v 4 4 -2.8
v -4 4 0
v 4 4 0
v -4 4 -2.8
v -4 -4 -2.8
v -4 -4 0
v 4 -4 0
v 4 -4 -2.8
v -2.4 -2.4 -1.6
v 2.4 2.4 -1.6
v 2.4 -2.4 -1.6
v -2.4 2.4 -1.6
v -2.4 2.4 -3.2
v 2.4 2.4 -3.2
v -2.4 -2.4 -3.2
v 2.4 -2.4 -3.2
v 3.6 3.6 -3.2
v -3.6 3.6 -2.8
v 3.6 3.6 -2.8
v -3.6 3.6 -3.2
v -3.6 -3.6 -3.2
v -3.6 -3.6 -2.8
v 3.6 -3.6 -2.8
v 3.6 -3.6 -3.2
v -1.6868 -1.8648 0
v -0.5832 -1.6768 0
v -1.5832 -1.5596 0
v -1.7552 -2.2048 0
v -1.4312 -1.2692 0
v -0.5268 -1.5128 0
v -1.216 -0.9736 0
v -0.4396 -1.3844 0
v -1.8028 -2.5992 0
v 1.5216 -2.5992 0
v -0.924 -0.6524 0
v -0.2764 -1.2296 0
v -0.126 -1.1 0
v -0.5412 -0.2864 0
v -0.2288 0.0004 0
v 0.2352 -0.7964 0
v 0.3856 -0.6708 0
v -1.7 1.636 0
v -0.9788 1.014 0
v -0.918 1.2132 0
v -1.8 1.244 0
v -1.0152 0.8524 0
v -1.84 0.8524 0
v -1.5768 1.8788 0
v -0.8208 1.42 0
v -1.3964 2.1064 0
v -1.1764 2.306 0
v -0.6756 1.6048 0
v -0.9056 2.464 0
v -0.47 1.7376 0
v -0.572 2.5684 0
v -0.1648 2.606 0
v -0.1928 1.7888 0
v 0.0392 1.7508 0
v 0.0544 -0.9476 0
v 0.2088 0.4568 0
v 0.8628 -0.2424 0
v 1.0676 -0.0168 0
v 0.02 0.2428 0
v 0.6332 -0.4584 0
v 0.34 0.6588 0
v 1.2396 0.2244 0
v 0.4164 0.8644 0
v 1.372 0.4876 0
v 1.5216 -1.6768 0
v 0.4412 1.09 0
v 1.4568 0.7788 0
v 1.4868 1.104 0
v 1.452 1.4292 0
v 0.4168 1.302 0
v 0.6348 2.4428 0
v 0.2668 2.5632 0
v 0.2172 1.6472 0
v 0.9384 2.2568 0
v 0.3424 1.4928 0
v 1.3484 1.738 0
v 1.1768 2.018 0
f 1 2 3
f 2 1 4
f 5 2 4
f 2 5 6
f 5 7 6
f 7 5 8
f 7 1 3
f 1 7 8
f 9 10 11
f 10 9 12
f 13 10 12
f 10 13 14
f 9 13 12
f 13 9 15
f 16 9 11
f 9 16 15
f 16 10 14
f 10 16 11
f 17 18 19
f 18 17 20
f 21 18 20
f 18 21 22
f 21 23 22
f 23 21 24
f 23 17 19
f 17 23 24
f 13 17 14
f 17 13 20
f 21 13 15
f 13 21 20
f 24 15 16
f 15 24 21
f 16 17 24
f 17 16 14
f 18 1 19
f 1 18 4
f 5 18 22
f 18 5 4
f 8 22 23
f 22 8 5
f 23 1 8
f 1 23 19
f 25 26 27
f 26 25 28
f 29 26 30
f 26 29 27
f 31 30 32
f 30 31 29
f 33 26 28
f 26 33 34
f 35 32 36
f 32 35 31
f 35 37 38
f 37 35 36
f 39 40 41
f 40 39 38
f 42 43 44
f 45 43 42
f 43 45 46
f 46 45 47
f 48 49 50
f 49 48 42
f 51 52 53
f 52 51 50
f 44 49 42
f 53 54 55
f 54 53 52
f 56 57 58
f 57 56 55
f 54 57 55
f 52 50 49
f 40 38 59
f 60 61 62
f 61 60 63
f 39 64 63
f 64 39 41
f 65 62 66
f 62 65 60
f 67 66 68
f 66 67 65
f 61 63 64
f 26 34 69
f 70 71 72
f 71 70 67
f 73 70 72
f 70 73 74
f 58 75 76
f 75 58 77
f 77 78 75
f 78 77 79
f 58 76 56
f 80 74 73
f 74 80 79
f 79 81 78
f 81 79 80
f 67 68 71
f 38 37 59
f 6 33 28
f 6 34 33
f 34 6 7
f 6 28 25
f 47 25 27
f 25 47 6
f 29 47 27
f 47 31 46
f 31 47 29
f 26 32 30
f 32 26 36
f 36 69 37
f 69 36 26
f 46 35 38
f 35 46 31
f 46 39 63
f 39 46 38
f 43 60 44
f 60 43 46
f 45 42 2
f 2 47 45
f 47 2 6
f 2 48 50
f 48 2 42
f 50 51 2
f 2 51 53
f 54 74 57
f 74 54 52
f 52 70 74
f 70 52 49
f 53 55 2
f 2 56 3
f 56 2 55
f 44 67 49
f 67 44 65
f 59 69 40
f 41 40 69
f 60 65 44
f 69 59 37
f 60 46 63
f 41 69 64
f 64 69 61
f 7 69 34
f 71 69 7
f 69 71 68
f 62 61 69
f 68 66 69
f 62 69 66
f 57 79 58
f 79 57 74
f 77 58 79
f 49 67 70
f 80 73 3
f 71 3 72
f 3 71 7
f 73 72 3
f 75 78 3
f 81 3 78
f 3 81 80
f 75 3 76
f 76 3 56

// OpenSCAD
// file: ../p/box5.scad
use <../lib.scad>
function ldraw_lib__box5() = [
// 0 Box with 5 Faces and All Edges
// 0 Name: box5.dat
// 0 Author: James Jessiman
// 0 !LDRAW_ORG Primitive UPDATE 2012-01
// 0 !LICENSE Licensed under CC BY 4.0 : see CAreadme.txt
// 
// 0 BFC CERTIFY CCW
  [0,"BFC","CERTIFY"],
  [0,"BFC","CCW"],
// 
// 0 !HISTORY 2002-04-03 [sbliss] Modified for BFC compliance
// 0 !HISTORY 2002-04-25 [PTadmin] Official Update 2002-02
// 0 !HISTORY 2007-06-24 [PTadmin] Header formatted for Contributor Agreement
// 0 !HISTORY 2008-07-01 [PTadmin] Official Update 2008-01
// 0 !HISTORY 2012-02-16 [Philo] Changed to CCW
// 0 !HISTORY 2012-03-30 [PTadmin] Official Update 2012-01
// 
// 
// 2 24 1 1 1 -1 1 1
  [2,24,1,1,1,-1,1,1],
// 2 24 -1 1 1 -1 1 -1
  [2,24,-1,1,1,-1,1,-1],
// 2 24 -1 1 -1 1 1 -1
  [2,24,-1,1,-1,1,1,-1],
// 2 24 1 1 -1 1 1 1
  [2,24,1,1,-1,1,1,1],
// 2 24 1 0 1 -1 0 1
  [2,24,1,0,1,-1,0,1],
// 2 24 -1 0 1 -1 0 -1
  [2,24,-1,0,1,-1,0,-1],
// 2 24 -1 0 -1 1 0 -1
  [2,24,-1,0,-1,1,0,-1],
// 2 24 1 0 -1 1 0 1
  [2,24,1,0,-1,1,0,1],
// 2 24 1 0 1 1 1 1
  [2,24,1,0,1,1,1,1],
// 2 24 -1 0 1 -1 1 1
  [2,24,-1,0,1,-1,1,1],
// 2 24 1 0 -1 1 1 -1
  [2,24,1,0,-1,1,1,-1],
// 2 24 -1 0 -1 -1 1 -1
  [2,24,-1,0,-1,-1,1,-1],
// 4 16 -1 1 1 1 1 1 1 1 -1 -1 1 -1
  [4,16,-1,1,1,1,1,1,1,1,-1,-1,1,-1],
// 4 16 -1 1 1 -1 0 1 1 0 1 1 1 1
  [4,16,-1,1,1,-1,0,1,1,0,1,1,1,1],
// 4 16 -1 1 -1 -1 0 -1 -1 0 1 -1 1 1
  [4,16,-1,1,-1,-1,0,-1,-1,0,1,-1,1,1],
// 4 16 1 1 -1 1 0 -1 -1 0 -1 -1 1 -1
  [4,16,1,1,-1,1,0,-1,-1,0,-1,-1,1,-1],
// 4 16 1 1 1 1 0 1 1 0 -1 1 1 -1
  [4,16,1,1,1,1,0,1,1,0,-1,1,1,-1],
];
module ldraw_lib__box5(step=0, col=false, unit=2/5, alt=false, line=0.2, solid=!$preview)
    makepoly(ldraw_lib__box5(), step=step, col=col, unit=unit, alt=alt, line=line, solid=solid);
ldraw_lib__box5(line=0.2);
// file: ../p/box4.scad
use <../lib.scad>
function ldraw_lib__box4() = [
// 0 Box with 4 Faces (2 Parallel Pairs) and All Edges
// 0 Name: box4.dat
// 0 Author: James Jessiman
// 0 !LDRAW_ORG Primitive UPDATE 2012-01
// 0 !LICENSE Licensed under CC BY 4.0 : see CAreadme.txt
// 
// 0 BFC CERTIFY CCW
  [0,"BFC","CERTIFY"],
  [0,"BFC","CCW"],
// 
// 0 !HISTORY 2002-04-03 [sbliss] Modified for BFC compliance
// 0 !HISTORY 2002-04-25 [PTadmin] Official Update 2002-02
// 0 !HISTORY 2007-06-24 [PTadmin] Header formatted for Contributor Agreement
// 0 !HISTORY 2008-07-01 [PTadmin] Official Update 2008-01
// 0 !HISTORY 2012-02-16 [Philo] Changed to CCW
// 0 !HISTORY 2012-03-30 [PTadmin] Official Update 2012-01
// 
// 
// 2 24 1 1 1 -1 1 1
  [2,24,1,1,1,-1,1,1],
// 2 24 -1 1 1 -1 1 -1
  [2,24,-1,1,1,-1,1,-1],
// 2 24 -1 1 -1 1 1 -1
  [2,24,-1,1,-1,1,1,-1],
// 2 24 1 1 -1 1 1 1
  [2,24,1,1,-1,1,1,1],
// 2 24 1 0 1 -1 0 1
  [2,24,1,0,1,-1,0,1],
// 2 24 -1 0 1 -1 0 -1
  [2,24,-1,0,1,-1,0,-1],
// 2 24 -1 0 -1 1 0 -1
  [2,24,-1,0,-1,1,0,-1],
// 2 24 1 0 -1 1 0 1
  [2,24,1,0,-1,1,0,1],
// 2 24 1 0 1 1 1 1
  [2,24,1,0,1,1,1,1],
// 2 24 -1 0 1 -1 1 1
  [2,24,-1,0,1,-1,1,1],
// 2 24 1 0 -1 1 1 -1
  [2,24,1,0,-1,1,1,-1],
// 2 24 -1 0 -1 -1 1 -1
  [2,24,-1,0,-1,-1,1,-1],
// 4 16 -1 1 1 -1 0 1 1 0 1 1 1 1
  [4,16,-1,1,1,-1,0,1,1,0,1,1,1,1],
// 4 16 -1 1 -1 -1 0 -1 -1 0 1 -1 1 1
  [4,16,-1,1,-1,-1,0,-1,-1,0,1,-1,1,1],
// 4 16 1 1 -1 1 0 -1 -1 0 -1 -1 1 -1
  [4,16,1,1,-1,1,0,-1,-1,0,-1,-1,1,-1],
// 4 16 1 1 1 1 0 1 1 0 -1 1 1 -1
  [4,16,1,1,1,1,0,1,1,0,-1,1,1,-1],
];
module ldraw_lib__box4(step=0, col=false, unit=2/5, alt=false, line=0.2, solid=!$preview)
    makepoly(ldraw_lib__box4(), step=step, col=col, unit=unit, alt=alt, line=line, solid=solid);
ldraw_lib__box4(line=0.2);
// file: s/3070bs01.scad
use <../../lib.scad>
use <../../p/box4.scad>
use <../../p/box5.scad>
function ldraw_lib__s__3070bs01() = [
// 0 ~Tile  1 x  1 with Groove without Top Face
// 0 Name: s\3070bs01.dat
// 0 Author: Chris Dee [cwdee]
// 0 !LDRAW_ORG Subpart UPDATE 2009-02
// 0 !LICENSE Licensed under CC BY 4.0 : see CAreadme.txt
// 
// 0 BFC CERTIFY CCW
  [0,"BFC","CERTIFY"],
  [0,"BFC","CCW"],
// 
// 0 !HISTORY 2009-09-03 [PTadmin] Official Update 2009-02
// 
// 
// 1 16 0 0 0 10 0 0 0 7 0 0 0 10 box4.dat
  [1,16,0,0,0,10,0,0,0,7,0,0,0,10, ldraw_lib__box4()],
// 0 BFC INVERTNEXT
  [0,"BFC","INVERTNEXT"],
// 1 16 0 8 0 6 0 0 0 -4 0 0 0 6 box5.dat
  [1,16,0,8,0,6,0,0,0,-4,0,0,0,6, ldraw_lib__box5()],
// 1 16 0 7 0 9 0 0 0 1 0 0 0 9 box4.dat
  [1,16,0,7,0,9,0,0,0,1,0,0,0,9, ldraw_lib__box4()],
// 
// 4 16 9 8 9 6 8 6 -6 8 6 -9 8 9
  [4,16,9,8,9,6,8,6,-6,8,6,-9,8,9],
// 4 16 -9 8 9 -6 8 6 -6 8 -6 -9 8 -9
  [4,16,-9,8,9,-6,8,6,-6,8,-6,-9,8,-9],
// 4 16 -9 8 -9 -6 8 -6 6 8 -6 9 8 -9
  [4,16,-9,8,-9,-6,8,-6,6,8,-6,9,8,-9],
// 4 16 9 8 -9 6 8 -6 6 8 6 9 8 9
  [4,16,9,8,-9,6,8,-6,6,8,6,9,8,9],
// 
// 4 16 10 7 10 9 7 9 -9 7 9 -10 7 10
  [4,16,10,7,10,9,7,9,-9,7,9,-10,7,10],
// 4 16 -10 7 10 -9 7 9 -9 7 -9 -10 7 -10
  [4,16,-10,7,10,-9,7,9,-9,7,-9,-10,7,-10],
// 4 16 -10 7 -10 -9 7 -9 9 7 -9 10 7 -10
  [4,16,-10,7,-10,-9,7,-9,9,7,-9,10,7,-10],
// 4 16 10 7 -10 9 7 -9 9 7 9 10 7 10
  [4,16,10,7,-10,9,7,-9,9,7,9,10,7,10],
// 0
];
module ldraw_lib__s__3070bs01(step=0, col=false, unit=2/5, alt=false, line=0.2, solid=!$preview)
    makepoly(ldraw_lib__s__3070bs01(), step=step, col=col, unit=unit, alt=alt, line=line, solid=solid);
ldraw_lib__s__3070bs01(line=0.2);
// main file
use <../lib.scad>
use <s/3070bs01.scad>
function ldraw_lib__3070bp02() = [
// 0 Tile  1 x  1 with Black "2" Pattern
// 0 Name: 3070bp02.dat
// 0 Author: John Riley [jriley]
// 0 !LDRAW_ORG Part UPDATE 2009-03
// 0 !LICENSE Licensed under CC BY 2.0 and CC BY 4.0 : see CAreadme.txt
// 
// 0 BFC CERTIFY CCW
  [0,"BFC","CERTIFY"],
  [0,"BFC","CCW"],
// 
// 0 !HISTORY 2003-12-19 [PTadmin] Official Update 2003-03
// 0 !HISTORY 2007-10-13 [PTadmin] Header formatted for Contributor Agreement
// 0 !HISTORY 2008-07-01 [PTadmin] Official Update 2008-01
// 0 !HISTORY 2009-08-12 [anathema] Improved pattern
// 0 !HISTORY 2009-12-29 [PTadmin] Official Update 2009-03
// 
// 
// 1 16 0 0 0 1 0 0 0 1 0 0 0 1 s\3070bs01.dat
  [1,16,0,0,0,1,0,0,0,1,0,0,0,1, ldraw_lib__s__3070bs01()],
// 4 0 -1.458 0 -4.192 -3.958 0 -3.899 -4.217 0 -4.662 -4.388 0 -5.512
  [4,0,-1.458,0,-4.192,-3.958,0,-3.899,-4.217,0,-4.662,-4.388,0,-5.512],
// 4 0 -3.578 0 -3.173 -3.958 0 -3.899 -1.458 0 -4.192 -1.317 0 -3.782
  [4,0,-3.578,0,-3.173,-3.958,0,-3.899,-1.458,0,-4.192,-1.317,0,-3.782],
// 4 0 -3.04 0 -2.434 -3.578 0 -3.173 -1.317 0 -3.782 -1.099 0 -3.461
  [4,0,-3.04,0,-2.434,-3.578,0,-3.173,-1.317,0,-3.782,-1.099,0,-3.461],
// 4 0 -1.458 0 -4.192 -4.388 0 -5.512 -4.507 0 -6.498 3.804 0 -6.498
  [4,0,-1.458,0,-4.192,-4.388,0,-5.512,-4.507,0,-6.498,3.804,0,-6.498],
// 4 0 -2.31 0 -1.631 -3.04 0 -2.434 -1.099 0 -3.461 -0.691 0 -3.074
  [4,0,-2.31,0,-1.631,-3.04,0,-2.434,-1.099,0,-3.461,-0.691,0,-3.074],
// 4 0 -0.315 0 -2.75 -1.353 0 -0.716 -2.31 0 -1.631 -0.691 0 -3.074
  [4,0,-0.315,0,-2.75,-1.353,0,-0.716,-2.31,0,-1.631,-0.691,0,-3.074],
// 4 0 -0.572 0 0.001 -1.353 0 -0.716 0.588 0 -1.991 0.964 0 -1.677
  [4,0,-0.572,0,0.001,-1.353,0,-0.716,0.588,0,-1.991,0.964,0,-1.677],
// 3 0 -4.25 0 4.09 -2.447 0 2.535 -2.295 0 3.033
  [3,0,-4.25,0,4.09,-2.447,0,2.535,-2.295,0,3.033],
// 4 0 -2.538 0 2.131 -2.447 0 2.535 -4.25 0 4.09 -4.5 0 3.11
  [4,0,-2.538,0,2.131,-2.447,0,2.535,-4.25,0,4.09,-4.5,0,3.11],
// 3 0 -2.538 0 2.131 -4.5 0 3.11 -4.6 0 2.131
  [3,0,-2.538,0,2.131,-4.5,0,3.11,-4.6,0,2.131],
// 4 0 -3.942 0 4.697 -4.25 0 4.09 -2.052 0 3.55 -3.491 0 5.266
  [4,0,-3.942,0,4.697,-4.25,0,4.09,-2.052,0,3.55,-3.491,0,5.266],
// 4 0 -2.941 0 5.765 -3.491 0 5.266 -1.689 0 4.012 -2.264 0 6.16
  [4,0,-2.941,0,5.765,-3.491,0,5.266,-1.689,0,4.012,-2.264,0,6.16],
// 3 0 -2.295 0 3.033 -2.052 0 3.55 -4.25 0 4.09
  [3,0,-2.295,0,3.033,-2.052,0,3.55,-4.25,0,4.09],
// 4 0 -2.264 0 6.16 -1.689 0 4.012 -1.175 0 4.344 -1.43 0 6.421
  [4,0,-2.264,0,6.16,-1.689,0,4.012,-1.175,0,4.344,-1.43,0,6.421],
// 4 0 -0.412 0 6.515 -1.43 0 6.421 -0.482 0 4.472 0.098 0 4.377
  [4,0,-0.412,0,6.515,-1.43,0,6.421,-0.482,0,4.472,0.098,0,4.377],
// 3 0 -1.175 0 4.344 -0.482 0 4.472 -1.43 0 6.421
  [3,0,-1.175,0,4.344,-0.482,0,4.472,-1.43,0,6.421],
// 3 0 -1.689 0 4.012 -3.491 0 5.266 -2.052 0 3.55
  [3,0,-1.689,0,4.012,-3.491,0,5.266,-2.052,0,3.55],
// 3 0 0.588 0 -1.991 -1.353 0 -0.716 0.136 0 -2.369
  [3,0,0.588,0,-1.991,-1.353,0,-0.716,0.136,0,-2.369],
// 4 0 0.522 0 1.142 0.05 0 0.607 2.157 0 -0.606 2.669 0 -0.042
  [4,0,0.522,0,1.142,0.05,0,0.607,2.157,0,-0.606,2.669,0,-0.042],
// 4 0 1.583 0 -1.146 0.05 0 0.607 -0.572 0 0.001 0.964 0 -1.677
  [4,0,1.583,0,-1.146,0.05,0,0.607,-0.572,0,0.001,0.964,0,-1.677],
// 4 0 0.85 0 1.647 0.522 0 1.142 2.669 0 -0.042 3.099 0 0.561
  [4,0,0.85,0,1.647,0.522,0,1.142,2.669,0,-0.042,3.099,0,0.561],
// 4 0 0.85 0 1.647 3.099 0 0.561 3.43 0 1.219 1.041 0 2.161
  [4,0,0.85,0,1.647,3.099,0,0.561,3.43,0,1.219,1.041,0,2.161],
// 3 0 2.157 0 -0.606 0.05 0 0.607 1.583 0 -1.146
  [3,0,2.157,0,-0.606,0.05,0,0.607,1.583,0,-1.146],
// 3 0 -1.458 0 -4.192 3.804 0 -6.498 3.804 0 -4.192
  [3,0,-1.458,0,-4.192,3.804,0,-6.498,3.804,0,-4.192],
// 4 0 1.103 0 2.725 1.041 0 2.161 3.642 0 1.947 3.717 0 2.76
  [4,0,1.103,0,2.725,1.041,0,2.161,3.642,0,1.947,3.717,0,2.76],
// 4 0 3.63 0 3.573 1.042 0 3.255 1.103 0 2.725 3.717 0 2.76
  [4,0,3.63,0,3.573,1.042,0,3.255,1.103,0,2.725,3.717,0,2.76],
// 4 0 1.587 0 6.107 0.667 0 6.408 0.098 0 4.377 0.543 0 4.118
  [4,0,1.587,0,6.107,0.667,0,6.408,0.098,0,4.377,0.543,0,4.118],
// 4 0 0.543 0 4.118 0.856 0 3.732 2.346 0 5.642 1.587 0 6.107
  [4,0,0.543,0,4.118,0.856,0,3.732,2.346,0,5.642,1.587,0,6.107],
// 3 0 0.098 0 4.377 0.667 0 6.408 -0.412 0 6.515
  [3,0,0.098,0,4.377,0.667,0,6.408,-0.412,0,6.515],
// 4 0 3.371 0 4.345 0.856 0 3.732 1.042 0 3.255 3.63 0 3.573
  [4,0,3.371,0,4.345,0.856,0,3.732,1.042,0,3.255,3.63,0,3.573],
// 4 0 2.942 0 5.045 2.346 0 5.642 0.856 0 3.732 3.371 0 4.345
  [4,0,2.942,0,5.045,2.346,0,5.642,0.856,0,3.732,3.371,0,4.345],
// 3 0 1.041 0 2.161 3.43 0 1.219 3.642 0 1.947
  [3,0,1.041,0,2.161,3.43,0,1.219,3.642,0,1.947],
// 3 0 -1.353 0 -0.716 -0.315 0 -2.75 0.136 0 -2.369
  [3,0,-1.353,0,-0.716,-0.315,0,-2.75,0.136,0,-2.369],
// 3 16 -10 0 -10 -4.507 0 -6.498 -4.388 0 -5.512
  [3,16,-10,0,-10,-4.507,0,-6.498,-4.388,0,-5.512],
// 4 16 3.804 0 -6.498 -4.507 0 -6.498 -10 0 -10 10 0 -10
  [4,16,3.804,0,-6.498,-4.507,0,-6.498,-10,0,-10,10,0,-10],
// 3 16 -10 0 -10 -4.388 0 -5.512 -4.217 0 -4.662
  [3,16,-10,0,-10,-4.388,0,-5.512,-4.217,0,-4.662],
// 4 16 -10 0 -10 -4.217 0 -4.662 -3.958 0 -3.899 -4.6 0 2.131
  [4,16,-10,0,-10,-4.217,0,-4.662,-3.958,0,-3.899,-4.6,0,2.131],
// 3 16 -3.578 0 -3.173 -4.6 0 2.131 -3.958 0 -3.899
  [3,16,-3.578,0,-3.173,-4.6,0,2.131,-3.958,0,-3.899],
// 4 16 -4.6 0 2.131 -3.578 0 -3.173 -3.04 0 -2.434 -2.538 0 2.131
  [4,16,-4.6,0,2.131,-3.578,0,-3.173,-3.04,0,-2.434,-2.538,0,2.131],
// 4 16 -1.099 0 -3.461 -1.317 0 -3.782 -1.458 0 -4.192 -0.691 0 -3.074
  [4,16,-1.099,0,-3.461,-1.317,0,-3.782,-1.458,0,-4.192,-0.691,0,-3.074],
// 4 16 -0.691 0 -3.074 -1.458 0 -4.192 3.804 0 -4.192 -0.315 0 -2.75
  [4,16,-0.691,0,-3.074,-1.458,0,-4.192,3.804,0,-4.192,-0.315,0,-2.75],
// 3 16 -2.538 0 2.131 -2.31 0 -1.631 -1.353 0 -0.716
  [3,16,-2.538,0,2.131,-2.31,0,-1.631,-1.353,0,-0.716],
// 3 16 -2.31 0 -1.631 -2.538 0 2.131 -3.04 0 -2.434
  [3,16,-2.31,0,-1.631,-2.538,0,2.131,-3.04,0,-2.434],
// 4 16 -2.538 0 2.131 -1.353 0 -0.716 -0.572 0 0.001 0.05 0 0.607
  [4,16,-2.538,0,2.131,-1.353,0,-0.716,-0.572,0,0.001,0.05,0,0.607],
// 4 16 -2.447 0 2.535 -2.538 0 2.131 0.522 0 1.142 -2.295 0 3.033
  [4,16,-2.447,0,2.535,-2.538,0,2.131,0.522,0,1.142,-2.295,0,3.033],
// 3 16 -4.5 0 3.11 -4.25 0 4.09 -10 0 10
  [3,16,-4.5,0,3.11,-4.25,0,4.09,-10,0,10],
// 4 16 -4.6 0 2.131 -4.5 0 3.11 -10 0 10 -10 0 -10
  [4,16,-4.6,0,2.131,-4.5,0,3.11,-10,0,10,-10,0,-10],
// 3 16 -10 0 10 -3.942 0 4.697 -3.491 0 5.266
  [3,16,-10,0,10,-3.942,0,4.697,-3.491,0,5.266],
// 3 16 -3.942 0 4.697 -10 0 10 -4.25 0 4.09
  [3,16,-3.942,0,4.697,-10,0,10,-4.25,0,4.09],
// 3 16 -3.491 0 5.266 -2.941 0 5.765 -10 0 10
  [3,16,-3.491,0,5.266,-2.941,0,5.765,-10,0,10],
// 3 16 -10 0 10 -2.941 0 5.765 -2.264 0 6.16
  [3,16,-10,0,10,-2.941,0,5.765,-2.264,0,6.16],
// 4 16 -1.175 0 4.344 -1.689 0 4.012 1.042 0 3.255 -0.482 0 4.472
  [4,16,-1.175,0,4.344,-1.689,0,4.012,1.042,0,3.255,-0.482,0,4.472],
// 4 16 -1.689 0 4.012 -2.052 0 3.55 1.103 0 2.725 1.042 0 3.255
  [4,16,-1.689,0,4.012,-2.052,0,3.55,1.103,0,2.725,1.042,0,3.255],
// 3 16 -2.264 0 6.16 -1.43 0 6.421 -10 0 10
  [3,16,-2.264,0,6.16,-1.43,0,6.421,-10,0,10],
// 4 16 -10 0 10 -1.43 0 6.421 -0.412 0 6.515 10 0 10
  [4,16,-10,0,10,-1.43,0,6.421,-0.412,0,6.515,10,0,10],
// 4 16 1.041 0 2.161 -2.052 0 3.55 -2.295 0 3.033 0.85 0 1.647
  [4,16,1.041,0,2.161,-2.052,0,3.55,-2.295,0,3.033,0.85,0,1.647],
// 3 16 0.136 0 -2.369 3.804 0 -4.192 0.588 0 -1.991
  [3,16,0.136,0,-2.369,3.804,0,-4.192,0.588,0,-1.991],
// 3 16 0.964 0 -1.677 0.588 0 -1.991 3.804 0 -4.192
  [3,16,0.964,0,-1.677,0.588,0,-1.991,3.804,0,-4.192],
// 3 16 0.522 0 1.142 0.85 0 1.647 -2.295 0 3.033
  [3,16,0.522,0,1.142,0.85,0,1.647,-2.295,0,3.033],
// 3 16 3.804 0 -4.192 0.136 0 -2.369 -0.315 0 -2.75
  [3,16,3.804,0,-4.192,0.136,0,-2.369,-0.315,0,-2.75],
// 3 16 0.522 0 1.142 -2.538 0 2.131 0.05 0 0.607
  [3,16,0.522,0,1.142,-2.538,0,2.131,0.05,0,0.607],
// 3 16 0.964 0 -1.677 3.804 0 -4.192 1.583 0 -1.146
  [3,16,0.964,0,-1.677,3.804,0,-4.192,1.583,0,-1.146],
// 3 16 1.583 0 -1.146 3.804 0 -4.192 2.157 0 -0.606
  [3,16,1.583,0,-1.146,3.804,0,-4.192,2.157,0,-0.606],
// 3 16 10 0 -10 3.804 0 -4.192 3.804 0 -6.498
  [3,16,10,0,-10,3.804,0,-4.192,3.804,0,-6.498],
// 4 16 3.642 0 1.947 3.43 0 1.219 3.804 0 -4.192 10 0 -10
  [4,16,3.642,0,1.947,3.43,0,1.219,3.804,0,-4.192,10,0,-10],
// 3 16 2.669 0 -0.042 2.157 0 -0.606 3.804 0 -4.192
  [3,16,2.669,0,-0.042,2.157,0,-0.606,3.804,0,-4.192],
// 3 16 3.43 0 1.219 3.099 0 0.561 3.804 0 -4.192
  [3,16,3.43,0,1.219,3.099,0,0.561,3.804,0,-4.192],
// 3 16 2.669 0 -0.042 3.804 0 -4.192 3.099 0 0.561
  [3,16,2.669,0,-0.042,3.804,0,-4.192,3.099,0,0.561],
// 4 16 -0.482 0 4.472 1.042 0 3.255 0.856 0 3.732 0.098 0 4.377
  [4,16,-0.482,0,4.472,1.042,0,3.255,0.856,0,3.732,0.098,0,4.377],
// 3 16 0.543 0 4.118 0.098 0 4.377 0.856 0 3.732
  [3,16,0.543,0,4.118,0.098,0,4.377,0.856,0,3.732],
// 3 16 -2.052 0 3.55 1.041 0 2.161 1.103 0 2.725
  [3,16,-2.052,0,3.55,1.041,0,2.161,1.103,0,2.725],
// 3 16 3.371 0 4.345 3.63 0 3.573 10 0 10
  [3,16,3.371,0,4.345,3.63,0,3.573,10,0,10],
// 4 16 10 0 10 3.717 0 2.76 3.642 0 1.947 10 0 -10
  [4,16,10,0,10,3.717,0,2.76,3.642,0,1.947,10,0,-10],
// 3 16 3.63 0 3.573 3.717 0 2.76 10 0 10
  [3,16,3.63,0,3.573,3.717,0,2.76,10,0,10],
// 3 16 1.587 0 6.107 2.346 0 5.642 10 0 10
  [3,16,1.587,0,6.107,2.346,0,5.642,10,0,10],
// 3 16 2.942 0 5.045 10 0 10 2.346 0 5.642
  [3,16,2.942,0,5.045,10,0,10,2.346,0,5.642],
// 3 16 10 0 10 2.942 0 5.045 3.371 0 4.345
  [3,16,10,0,10,2.942,0,5.045,3.371,0,4.345],
// 3 16 1.587 0 6.107 10 0 10 0.667 0 6.408
  [3,16,1.587,0,6.107,10,0,10,0.667,0,6.408],
// 3 16 0.667 0 6.408 10 0 10 -0.412 0 6.515
  [3,16,0.667,0,6.408,10,0,10,-0.412,0,6.515],
// 0
];
module ldraw_lib__3070bp02(step=0, col=false, unit=2/5, alt=false, line=0.2, solid=!$preview)
    makepoly(ldraw_lib__3070bp02(), step=step, col=col, unit=unit, alt=alt, line=line, solid=solid);
ldraw_lib__3070bp02(line=0.2);
